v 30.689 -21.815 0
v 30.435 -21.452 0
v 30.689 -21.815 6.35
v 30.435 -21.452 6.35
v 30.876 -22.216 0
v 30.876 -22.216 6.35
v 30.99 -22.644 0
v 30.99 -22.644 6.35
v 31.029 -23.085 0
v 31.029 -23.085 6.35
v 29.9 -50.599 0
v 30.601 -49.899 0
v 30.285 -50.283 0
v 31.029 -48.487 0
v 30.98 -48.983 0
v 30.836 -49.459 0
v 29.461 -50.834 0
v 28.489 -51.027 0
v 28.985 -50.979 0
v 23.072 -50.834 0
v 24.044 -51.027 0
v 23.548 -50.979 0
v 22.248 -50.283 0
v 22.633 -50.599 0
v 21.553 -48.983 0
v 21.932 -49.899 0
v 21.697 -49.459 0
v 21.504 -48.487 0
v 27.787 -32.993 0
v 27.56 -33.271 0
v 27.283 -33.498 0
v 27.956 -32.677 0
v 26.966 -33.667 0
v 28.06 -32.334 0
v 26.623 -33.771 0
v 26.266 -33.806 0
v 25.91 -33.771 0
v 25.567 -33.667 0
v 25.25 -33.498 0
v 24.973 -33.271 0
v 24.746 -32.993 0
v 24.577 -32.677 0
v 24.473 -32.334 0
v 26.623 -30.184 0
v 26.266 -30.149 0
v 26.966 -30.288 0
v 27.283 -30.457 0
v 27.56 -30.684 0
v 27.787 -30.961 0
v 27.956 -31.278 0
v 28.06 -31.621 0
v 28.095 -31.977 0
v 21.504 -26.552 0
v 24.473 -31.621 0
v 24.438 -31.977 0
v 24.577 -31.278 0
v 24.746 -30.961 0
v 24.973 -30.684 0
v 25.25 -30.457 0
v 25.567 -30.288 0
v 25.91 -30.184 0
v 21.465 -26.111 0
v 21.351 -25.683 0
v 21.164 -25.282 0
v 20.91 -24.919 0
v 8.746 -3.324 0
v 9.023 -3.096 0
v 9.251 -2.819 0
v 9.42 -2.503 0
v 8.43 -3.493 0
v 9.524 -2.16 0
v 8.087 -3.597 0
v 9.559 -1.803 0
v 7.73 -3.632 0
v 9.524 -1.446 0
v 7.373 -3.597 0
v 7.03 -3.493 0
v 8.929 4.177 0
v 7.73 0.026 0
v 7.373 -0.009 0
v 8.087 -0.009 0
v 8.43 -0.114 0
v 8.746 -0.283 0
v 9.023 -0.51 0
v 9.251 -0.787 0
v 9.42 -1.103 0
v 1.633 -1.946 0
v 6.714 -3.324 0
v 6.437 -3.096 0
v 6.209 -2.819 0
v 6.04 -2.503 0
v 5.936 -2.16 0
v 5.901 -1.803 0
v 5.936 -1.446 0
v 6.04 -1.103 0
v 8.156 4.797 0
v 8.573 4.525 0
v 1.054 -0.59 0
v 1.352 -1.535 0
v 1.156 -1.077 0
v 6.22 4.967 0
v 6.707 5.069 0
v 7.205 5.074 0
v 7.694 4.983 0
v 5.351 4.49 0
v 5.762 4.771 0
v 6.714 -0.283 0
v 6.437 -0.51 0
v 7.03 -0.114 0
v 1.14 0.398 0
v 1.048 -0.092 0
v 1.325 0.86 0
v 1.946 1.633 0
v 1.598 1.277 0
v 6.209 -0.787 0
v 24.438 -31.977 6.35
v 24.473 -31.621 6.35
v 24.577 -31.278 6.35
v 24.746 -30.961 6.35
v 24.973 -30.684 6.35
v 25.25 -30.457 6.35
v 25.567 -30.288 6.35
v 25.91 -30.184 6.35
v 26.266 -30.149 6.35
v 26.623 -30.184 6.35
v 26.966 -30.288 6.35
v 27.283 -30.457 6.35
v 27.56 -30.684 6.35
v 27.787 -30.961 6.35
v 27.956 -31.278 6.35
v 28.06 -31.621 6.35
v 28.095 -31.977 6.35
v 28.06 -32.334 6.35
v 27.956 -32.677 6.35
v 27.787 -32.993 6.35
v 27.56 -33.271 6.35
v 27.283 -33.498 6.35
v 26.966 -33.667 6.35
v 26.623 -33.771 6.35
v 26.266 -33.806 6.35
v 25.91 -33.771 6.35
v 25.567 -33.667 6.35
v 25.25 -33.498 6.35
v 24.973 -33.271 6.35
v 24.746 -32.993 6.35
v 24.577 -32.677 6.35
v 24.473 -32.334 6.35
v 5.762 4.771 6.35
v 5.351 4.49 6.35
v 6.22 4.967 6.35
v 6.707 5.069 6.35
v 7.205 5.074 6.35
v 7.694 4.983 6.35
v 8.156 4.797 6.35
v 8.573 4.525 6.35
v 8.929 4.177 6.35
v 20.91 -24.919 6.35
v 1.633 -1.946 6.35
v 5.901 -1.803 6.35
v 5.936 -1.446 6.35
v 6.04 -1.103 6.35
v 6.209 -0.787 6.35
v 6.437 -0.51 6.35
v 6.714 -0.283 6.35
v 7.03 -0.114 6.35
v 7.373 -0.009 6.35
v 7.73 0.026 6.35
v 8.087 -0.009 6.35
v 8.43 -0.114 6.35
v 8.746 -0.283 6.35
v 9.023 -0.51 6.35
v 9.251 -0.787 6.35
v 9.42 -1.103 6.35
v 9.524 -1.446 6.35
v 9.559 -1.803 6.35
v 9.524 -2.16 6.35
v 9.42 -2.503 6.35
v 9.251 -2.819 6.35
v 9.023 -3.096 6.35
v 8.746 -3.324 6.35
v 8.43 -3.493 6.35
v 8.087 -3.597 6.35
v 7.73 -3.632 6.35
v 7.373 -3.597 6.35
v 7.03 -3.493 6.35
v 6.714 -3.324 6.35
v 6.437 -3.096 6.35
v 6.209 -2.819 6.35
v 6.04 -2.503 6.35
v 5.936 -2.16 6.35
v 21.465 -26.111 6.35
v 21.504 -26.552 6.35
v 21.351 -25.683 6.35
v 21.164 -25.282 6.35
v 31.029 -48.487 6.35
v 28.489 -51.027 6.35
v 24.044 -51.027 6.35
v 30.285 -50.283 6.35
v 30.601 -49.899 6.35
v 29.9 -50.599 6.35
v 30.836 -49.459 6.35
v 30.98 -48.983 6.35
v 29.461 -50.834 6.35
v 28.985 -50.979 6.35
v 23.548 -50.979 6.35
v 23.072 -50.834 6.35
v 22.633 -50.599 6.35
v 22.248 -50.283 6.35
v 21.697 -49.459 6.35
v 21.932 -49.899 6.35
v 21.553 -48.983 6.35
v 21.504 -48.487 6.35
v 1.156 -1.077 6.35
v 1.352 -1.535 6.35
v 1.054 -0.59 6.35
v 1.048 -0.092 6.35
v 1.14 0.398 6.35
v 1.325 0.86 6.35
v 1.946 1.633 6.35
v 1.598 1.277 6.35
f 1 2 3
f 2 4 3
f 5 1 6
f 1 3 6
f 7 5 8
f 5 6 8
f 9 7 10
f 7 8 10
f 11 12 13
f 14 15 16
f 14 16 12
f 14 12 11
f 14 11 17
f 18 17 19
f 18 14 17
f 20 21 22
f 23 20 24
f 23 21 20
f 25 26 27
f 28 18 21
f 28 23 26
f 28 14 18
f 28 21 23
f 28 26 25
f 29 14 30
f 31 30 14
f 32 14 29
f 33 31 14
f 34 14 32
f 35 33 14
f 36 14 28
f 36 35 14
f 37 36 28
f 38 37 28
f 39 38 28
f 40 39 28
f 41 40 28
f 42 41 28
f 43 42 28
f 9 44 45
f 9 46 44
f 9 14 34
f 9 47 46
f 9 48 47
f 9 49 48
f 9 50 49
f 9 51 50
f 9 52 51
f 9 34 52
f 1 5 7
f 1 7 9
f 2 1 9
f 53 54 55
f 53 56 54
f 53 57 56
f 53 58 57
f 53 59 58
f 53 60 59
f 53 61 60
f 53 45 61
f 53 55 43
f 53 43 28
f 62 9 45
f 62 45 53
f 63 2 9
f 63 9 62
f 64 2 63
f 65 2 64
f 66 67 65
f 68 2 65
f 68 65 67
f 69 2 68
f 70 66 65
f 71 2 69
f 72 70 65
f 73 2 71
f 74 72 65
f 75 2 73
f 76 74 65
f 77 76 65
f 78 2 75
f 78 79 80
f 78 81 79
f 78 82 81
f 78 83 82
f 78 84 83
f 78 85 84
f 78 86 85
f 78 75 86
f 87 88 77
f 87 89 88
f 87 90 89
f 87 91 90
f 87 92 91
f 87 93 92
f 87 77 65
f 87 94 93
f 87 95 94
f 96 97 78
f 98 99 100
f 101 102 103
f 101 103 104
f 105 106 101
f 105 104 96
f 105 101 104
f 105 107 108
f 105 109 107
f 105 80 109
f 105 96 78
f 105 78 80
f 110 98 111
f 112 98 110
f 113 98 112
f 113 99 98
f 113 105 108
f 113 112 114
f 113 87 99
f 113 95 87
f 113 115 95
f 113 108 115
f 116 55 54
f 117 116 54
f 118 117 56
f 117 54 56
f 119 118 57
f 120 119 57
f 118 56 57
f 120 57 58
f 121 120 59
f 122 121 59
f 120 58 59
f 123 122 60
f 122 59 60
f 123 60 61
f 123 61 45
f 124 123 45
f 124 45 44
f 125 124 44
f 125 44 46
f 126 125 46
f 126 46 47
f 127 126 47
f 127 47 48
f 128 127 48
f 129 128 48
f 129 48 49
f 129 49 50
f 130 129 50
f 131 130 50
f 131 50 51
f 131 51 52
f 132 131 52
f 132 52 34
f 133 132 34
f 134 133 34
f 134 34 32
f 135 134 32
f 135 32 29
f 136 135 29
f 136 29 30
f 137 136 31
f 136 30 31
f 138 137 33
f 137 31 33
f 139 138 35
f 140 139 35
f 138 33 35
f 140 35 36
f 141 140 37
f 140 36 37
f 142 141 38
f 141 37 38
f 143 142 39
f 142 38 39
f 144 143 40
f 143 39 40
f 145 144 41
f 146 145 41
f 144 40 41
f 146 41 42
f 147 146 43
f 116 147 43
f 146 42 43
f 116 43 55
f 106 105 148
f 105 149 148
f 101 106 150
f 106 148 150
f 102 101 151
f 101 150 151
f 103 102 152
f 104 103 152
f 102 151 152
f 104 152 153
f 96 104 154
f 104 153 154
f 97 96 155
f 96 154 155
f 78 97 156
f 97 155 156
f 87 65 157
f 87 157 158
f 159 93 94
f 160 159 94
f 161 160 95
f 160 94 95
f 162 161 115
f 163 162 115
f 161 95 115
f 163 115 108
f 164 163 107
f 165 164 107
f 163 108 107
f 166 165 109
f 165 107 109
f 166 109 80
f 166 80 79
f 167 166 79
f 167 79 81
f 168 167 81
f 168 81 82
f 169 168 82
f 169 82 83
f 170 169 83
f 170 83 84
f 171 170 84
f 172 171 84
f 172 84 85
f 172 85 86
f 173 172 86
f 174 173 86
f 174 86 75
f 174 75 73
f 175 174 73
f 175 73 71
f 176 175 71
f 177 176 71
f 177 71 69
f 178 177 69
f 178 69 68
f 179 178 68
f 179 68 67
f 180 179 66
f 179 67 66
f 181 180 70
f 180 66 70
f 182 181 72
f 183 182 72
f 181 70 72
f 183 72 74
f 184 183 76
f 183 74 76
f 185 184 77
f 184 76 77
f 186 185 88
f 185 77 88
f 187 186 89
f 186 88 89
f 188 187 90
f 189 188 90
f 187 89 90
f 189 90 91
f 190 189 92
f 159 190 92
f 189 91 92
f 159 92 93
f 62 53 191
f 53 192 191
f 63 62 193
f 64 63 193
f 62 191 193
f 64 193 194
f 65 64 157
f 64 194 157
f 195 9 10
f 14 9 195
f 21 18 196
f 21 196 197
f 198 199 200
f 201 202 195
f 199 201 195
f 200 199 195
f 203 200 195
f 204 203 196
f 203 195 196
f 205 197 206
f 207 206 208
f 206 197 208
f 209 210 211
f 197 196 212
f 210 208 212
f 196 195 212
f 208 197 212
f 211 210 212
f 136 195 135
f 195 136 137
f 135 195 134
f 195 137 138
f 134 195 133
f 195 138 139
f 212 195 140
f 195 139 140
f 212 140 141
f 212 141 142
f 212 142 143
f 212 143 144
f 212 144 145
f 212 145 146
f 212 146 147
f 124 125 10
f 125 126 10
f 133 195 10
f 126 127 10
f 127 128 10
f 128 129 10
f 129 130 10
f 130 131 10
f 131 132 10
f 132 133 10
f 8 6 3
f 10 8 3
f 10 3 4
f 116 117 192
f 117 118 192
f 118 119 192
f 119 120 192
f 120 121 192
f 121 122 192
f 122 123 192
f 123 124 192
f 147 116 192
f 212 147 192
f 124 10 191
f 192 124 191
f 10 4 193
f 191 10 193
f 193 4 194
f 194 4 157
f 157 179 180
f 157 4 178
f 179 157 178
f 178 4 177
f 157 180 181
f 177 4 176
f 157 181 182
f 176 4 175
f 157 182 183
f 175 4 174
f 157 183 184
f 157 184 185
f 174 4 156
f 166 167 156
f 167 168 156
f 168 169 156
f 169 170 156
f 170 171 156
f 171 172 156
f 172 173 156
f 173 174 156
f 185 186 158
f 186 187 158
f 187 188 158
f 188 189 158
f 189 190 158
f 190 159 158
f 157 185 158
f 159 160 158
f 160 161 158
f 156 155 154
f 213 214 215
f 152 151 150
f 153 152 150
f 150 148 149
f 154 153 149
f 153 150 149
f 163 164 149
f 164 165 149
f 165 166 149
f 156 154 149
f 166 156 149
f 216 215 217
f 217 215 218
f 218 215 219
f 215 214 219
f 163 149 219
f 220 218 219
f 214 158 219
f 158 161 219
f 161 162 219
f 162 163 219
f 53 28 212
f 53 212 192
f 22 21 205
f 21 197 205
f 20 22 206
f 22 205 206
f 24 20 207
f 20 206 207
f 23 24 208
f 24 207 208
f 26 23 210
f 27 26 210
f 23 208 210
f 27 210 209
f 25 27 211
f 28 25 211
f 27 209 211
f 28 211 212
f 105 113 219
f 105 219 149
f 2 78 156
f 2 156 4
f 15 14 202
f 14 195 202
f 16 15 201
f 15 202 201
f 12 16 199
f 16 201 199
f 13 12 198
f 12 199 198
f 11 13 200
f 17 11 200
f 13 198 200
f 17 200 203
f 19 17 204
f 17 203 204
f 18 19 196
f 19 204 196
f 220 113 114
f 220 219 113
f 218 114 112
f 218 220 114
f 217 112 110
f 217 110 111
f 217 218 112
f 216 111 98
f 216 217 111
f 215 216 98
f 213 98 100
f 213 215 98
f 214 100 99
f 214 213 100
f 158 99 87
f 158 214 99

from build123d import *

# Parameters (mm, degrees)
BOSS_EXTRUDE1_DEPTH       = 6.35
FILLET1_R                 = 2.54
F_6_CLEARANCE_HOLE1_D     = 3.6576
F_6_CLEARANCE_HOLE1_DEPTH = 10.16
F_6_CLEARANCE_HOLE1_TIP   = 1.0988539


with BuildPart() as part:
    # Sketch1 → Boss-Extrude1 (new body)
    with BuildSketch(Plane.XY):
        Polygon((0, 0), (7.296573321, 6.122551982), (31.02898218, -22.160631536), (31.02898218, -51.027448018), (21.50398218, -51.027448018), (21.50398218, -25.627448018), align=None)
    extrude(amount=BOSS_EXTRUDE1_DEPTH)

    # Fillet1
    fillet1_edges = [part.edges().sort_by_distance(p)[0] for p in [
        (0, 0, 3.175),
        (7.296573321, 6.122551982, 3.175),
        (31.02898218, -22.160631536, 3.175),
        (31.02898218, -51.027448018, 3.175),
        (21.50398218, -51.027448018, 3.175),
        (21.50398218, -25.627448018, 3.175),
    ]]
    fillet(fillet1_edges, radius=FILLET1_R)

    # #6 Clearance Hole1
    with Locations(Plane.XY.offset(6.35)):
        with Locations((7.729987982, -1.803106223), (26.26648218, -31.977448018)):
            Hole(F_6_CLEARANCE_HOLE1_D / 2, depth=F_6_CLEARANCE_HOLE1_DEPTH)
            with Locations((0, 0, -(F_6_CLEARANCE_HOLE1_DEPTH + F_6_CLEARANCE_HOLE1_TIP / 2))):  # 118° drill point
                Cone(0, F_6_CLEARANCE_HOLE1_D / 2, F_6_CLEARANCE_HOLE1_TIP, mode=Mode.SUBTRACT)


solid = part.part
